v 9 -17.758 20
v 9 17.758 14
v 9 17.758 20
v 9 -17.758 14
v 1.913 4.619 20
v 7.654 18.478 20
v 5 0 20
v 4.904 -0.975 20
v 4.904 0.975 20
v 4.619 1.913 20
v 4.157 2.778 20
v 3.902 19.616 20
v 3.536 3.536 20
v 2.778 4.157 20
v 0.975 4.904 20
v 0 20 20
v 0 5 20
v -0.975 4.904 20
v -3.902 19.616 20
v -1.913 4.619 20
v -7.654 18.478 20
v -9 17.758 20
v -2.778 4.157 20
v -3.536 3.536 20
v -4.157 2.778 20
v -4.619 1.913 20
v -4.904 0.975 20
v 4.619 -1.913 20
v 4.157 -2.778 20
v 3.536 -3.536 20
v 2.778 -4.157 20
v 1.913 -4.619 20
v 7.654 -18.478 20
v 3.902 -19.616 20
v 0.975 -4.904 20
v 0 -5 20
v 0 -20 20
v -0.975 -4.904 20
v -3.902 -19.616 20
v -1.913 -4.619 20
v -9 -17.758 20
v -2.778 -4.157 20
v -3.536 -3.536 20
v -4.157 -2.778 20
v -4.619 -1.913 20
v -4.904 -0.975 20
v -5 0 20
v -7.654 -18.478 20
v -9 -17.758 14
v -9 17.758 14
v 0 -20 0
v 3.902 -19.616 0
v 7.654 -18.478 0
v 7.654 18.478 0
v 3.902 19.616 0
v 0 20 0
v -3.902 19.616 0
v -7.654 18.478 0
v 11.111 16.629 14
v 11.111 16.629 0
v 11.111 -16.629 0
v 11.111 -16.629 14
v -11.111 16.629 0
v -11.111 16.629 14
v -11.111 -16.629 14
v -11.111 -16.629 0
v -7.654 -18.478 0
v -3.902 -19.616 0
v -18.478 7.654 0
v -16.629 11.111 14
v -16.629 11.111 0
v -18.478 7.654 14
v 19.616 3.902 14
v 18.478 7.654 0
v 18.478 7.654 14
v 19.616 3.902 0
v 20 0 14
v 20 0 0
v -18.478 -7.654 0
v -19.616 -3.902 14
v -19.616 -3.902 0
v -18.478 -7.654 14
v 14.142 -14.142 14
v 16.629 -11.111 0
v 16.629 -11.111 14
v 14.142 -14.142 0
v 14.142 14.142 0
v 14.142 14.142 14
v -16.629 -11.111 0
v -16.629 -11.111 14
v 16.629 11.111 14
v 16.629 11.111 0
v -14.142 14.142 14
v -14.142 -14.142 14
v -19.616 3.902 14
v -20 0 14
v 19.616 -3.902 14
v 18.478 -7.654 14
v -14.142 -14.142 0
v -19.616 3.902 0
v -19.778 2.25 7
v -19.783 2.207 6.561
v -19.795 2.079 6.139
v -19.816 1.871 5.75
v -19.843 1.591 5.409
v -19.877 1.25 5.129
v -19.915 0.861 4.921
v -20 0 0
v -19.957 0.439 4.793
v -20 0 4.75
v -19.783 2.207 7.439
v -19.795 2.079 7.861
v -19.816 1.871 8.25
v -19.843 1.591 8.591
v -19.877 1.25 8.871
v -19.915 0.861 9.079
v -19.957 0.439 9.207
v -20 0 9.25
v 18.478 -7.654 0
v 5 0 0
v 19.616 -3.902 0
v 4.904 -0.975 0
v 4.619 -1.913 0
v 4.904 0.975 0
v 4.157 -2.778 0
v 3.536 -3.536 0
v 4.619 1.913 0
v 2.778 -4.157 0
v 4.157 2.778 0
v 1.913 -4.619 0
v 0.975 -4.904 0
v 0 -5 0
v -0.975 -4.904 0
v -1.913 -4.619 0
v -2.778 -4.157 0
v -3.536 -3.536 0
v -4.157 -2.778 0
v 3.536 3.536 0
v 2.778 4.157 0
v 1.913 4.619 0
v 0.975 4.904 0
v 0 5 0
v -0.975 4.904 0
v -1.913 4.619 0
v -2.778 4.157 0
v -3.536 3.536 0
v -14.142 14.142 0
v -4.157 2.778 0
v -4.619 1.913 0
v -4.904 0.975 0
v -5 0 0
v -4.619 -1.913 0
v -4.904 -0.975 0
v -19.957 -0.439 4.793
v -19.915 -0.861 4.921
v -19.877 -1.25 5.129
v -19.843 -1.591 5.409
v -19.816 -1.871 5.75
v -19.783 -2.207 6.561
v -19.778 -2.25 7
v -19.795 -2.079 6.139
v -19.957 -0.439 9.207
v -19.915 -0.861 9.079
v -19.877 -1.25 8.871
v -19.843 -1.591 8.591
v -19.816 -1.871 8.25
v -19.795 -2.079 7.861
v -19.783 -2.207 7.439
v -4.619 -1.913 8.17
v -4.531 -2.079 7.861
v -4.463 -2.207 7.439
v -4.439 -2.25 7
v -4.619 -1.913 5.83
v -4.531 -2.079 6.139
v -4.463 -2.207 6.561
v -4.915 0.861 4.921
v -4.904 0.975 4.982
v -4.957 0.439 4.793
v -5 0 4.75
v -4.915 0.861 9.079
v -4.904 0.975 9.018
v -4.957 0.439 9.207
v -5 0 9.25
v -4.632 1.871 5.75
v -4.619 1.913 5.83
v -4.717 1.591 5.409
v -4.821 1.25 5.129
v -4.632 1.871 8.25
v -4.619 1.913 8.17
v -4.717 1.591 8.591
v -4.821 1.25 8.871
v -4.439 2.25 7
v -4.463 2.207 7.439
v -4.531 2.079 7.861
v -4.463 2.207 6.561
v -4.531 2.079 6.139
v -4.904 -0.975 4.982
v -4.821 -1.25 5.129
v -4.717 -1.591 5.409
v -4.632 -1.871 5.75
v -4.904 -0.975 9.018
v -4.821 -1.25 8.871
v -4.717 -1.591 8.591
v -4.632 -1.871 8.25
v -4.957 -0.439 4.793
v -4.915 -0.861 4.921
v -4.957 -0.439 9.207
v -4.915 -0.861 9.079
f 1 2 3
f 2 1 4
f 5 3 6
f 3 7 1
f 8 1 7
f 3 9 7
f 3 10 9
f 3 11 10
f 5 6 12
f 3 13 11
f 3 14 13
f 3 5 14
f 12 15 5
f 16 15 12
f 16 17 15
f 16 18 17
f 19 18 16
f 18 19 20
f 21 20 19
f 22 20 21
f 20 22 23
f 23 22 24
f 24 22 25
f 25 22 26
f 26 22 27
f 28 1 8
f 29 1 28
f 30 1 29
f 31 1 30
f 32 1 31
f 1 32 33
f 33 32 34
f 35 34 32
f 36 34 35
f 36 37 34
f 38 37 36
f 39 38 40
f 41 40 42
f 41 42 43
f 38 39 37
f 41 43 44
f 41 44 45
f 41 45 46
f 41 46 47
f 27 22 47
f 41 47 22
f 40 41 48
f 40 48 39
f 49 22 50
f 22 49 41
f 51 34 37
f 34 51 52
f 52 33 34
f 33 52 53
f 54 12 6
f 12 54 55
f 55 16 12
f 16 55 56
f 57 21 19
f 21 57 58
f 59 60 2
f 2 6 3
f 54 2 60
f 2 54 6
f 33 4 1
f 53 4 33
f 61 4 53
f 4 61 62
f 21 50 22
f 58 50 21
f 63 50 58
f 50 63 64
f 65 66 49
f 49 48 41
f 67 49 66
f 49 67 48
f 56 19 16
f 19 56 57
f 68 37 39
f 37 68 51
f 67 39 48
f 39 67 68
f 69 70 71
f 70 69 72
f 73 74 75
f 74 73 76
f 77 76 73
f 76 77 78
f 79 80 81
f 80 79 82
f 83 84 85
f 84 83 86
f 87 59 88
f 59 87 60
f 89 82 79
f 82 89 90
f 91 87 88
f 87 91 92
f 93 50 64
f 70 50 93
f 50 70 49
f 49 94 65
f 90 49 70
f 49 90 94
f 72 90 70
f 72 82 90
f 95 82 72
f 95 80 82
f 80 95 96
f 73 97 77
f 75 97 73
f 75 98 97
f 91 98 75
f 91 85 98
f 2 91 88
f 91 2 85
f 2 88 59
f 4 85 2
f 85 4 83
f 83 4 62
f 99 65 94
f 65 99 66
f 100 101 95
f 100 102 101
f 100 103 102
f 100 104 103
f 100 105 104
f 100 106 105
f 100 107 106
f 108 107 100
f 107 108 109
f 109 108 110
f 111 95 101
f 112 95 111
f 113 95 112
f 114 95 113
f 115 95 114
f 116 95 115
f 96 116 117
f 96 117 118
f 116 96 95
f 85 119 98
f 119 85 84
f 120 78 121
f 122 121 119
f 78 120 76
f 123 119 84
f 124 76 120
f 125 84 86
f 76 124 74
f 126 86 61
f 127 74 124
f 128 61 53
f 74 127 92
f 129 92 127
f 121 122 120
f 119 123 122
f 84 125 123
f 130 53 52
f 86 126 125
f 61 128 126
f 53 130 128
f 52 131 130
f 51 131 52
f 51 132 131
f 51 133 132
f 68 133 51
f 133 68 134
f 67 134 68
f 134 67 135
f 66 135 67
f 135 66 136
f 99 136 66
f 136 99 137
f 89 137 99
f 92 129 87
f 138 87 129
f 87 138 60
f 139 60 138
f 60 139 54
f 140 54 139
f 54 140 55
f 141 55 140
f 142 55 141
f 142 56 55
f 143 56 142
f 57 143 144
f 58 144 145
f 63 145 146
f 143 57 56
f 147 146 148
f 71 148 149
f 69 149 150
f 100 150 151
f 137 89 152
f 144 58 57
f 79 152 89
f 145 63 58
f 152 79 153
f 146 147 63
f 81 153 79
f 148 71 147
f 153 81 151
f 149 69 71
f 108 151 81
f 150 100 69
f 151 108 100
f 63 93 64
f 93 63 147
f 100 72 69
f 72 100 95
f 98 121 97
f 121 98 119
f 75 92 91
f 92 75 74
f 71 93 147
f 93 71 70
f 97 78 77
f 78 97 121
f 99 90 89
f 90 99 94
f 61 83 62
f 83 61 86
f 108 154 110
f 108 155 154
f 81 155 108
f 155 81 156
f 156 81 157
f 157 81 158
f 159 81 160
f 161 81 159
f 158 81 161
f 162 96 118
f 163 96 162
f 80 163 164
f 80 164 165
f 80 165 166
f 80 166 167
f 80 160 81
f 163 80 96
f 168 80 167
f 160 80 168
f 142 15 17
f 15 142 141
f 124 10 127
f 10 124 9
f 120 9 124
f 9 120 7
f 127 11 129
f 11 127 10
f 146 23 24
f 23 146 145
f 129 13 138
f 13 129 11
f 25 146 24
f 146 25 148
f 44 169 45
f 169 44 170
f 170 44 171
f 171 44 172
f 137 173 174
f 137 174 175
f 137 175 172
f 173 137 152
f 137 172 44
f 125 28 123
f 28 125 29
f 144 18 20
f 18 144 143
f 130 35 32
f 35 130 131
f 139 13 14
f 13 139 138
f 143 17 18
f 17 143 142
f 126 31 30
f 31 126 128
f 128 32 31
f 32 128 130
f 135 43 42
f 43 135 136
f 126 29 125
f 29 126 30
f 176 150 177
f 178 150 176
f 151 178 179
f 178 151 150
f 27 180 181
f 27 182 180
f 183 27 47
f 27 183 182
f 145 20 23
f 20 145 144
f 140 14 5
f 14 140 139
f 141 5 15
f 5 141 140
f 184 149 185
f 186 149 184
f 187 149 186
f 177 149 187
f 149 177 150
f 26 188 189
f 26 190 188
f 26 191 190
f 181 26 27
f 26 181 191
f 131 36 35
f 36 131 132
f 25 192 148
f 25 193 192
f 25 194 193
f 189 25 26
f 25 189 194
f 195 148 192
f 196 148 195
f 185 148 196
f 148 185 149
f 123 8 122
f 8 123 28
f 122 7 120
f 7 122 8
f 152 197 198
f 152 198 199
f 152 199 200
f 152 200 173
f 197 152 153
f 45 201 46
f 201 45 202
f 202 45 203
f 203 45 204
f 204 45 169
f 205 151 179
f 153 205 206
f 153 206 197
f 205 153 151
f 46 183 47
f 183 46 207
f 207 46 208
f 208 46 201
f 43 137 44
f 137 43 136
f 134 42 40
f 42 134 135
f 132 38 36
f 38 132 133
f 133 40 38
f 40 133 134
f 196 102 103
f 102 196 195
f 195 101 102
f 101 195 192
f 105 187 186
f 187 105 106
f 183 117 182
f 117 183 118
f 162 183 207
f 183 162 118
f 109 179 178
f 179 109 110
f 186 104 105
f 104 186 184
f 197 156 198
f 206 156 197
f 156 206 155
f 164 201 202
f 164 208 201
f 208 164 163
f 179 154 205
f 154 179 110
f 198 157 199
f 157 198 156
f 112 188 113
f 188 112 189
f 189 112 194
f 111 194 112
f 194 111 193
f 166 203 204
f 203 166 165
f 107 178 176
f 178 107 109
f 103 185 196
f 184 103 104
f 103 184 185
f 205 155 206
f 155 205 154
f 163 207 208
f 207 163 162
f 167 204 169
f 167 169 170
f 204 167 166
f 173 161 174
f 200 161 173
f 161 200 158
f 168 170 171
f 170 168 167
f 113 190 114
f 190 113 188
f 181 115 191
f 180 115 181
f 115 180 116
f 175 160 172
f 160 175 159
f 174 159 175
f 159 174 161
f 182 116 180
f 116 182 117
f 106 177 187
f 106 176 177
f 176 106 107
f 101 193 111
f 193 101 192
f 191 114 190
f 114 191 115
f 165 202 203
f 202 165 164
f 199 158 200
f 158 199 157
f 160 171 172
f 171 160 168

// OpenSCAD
$fn = 32;

// ----------------------------------------------------------------------
// Oldham coupling hub: 40 x 20 mm
// ----------------------------------------------------------------------

// --- parameters (mm) ---
body_d = 40;              // hub diameter
body_l = 14;              // hub length
shaft_d = 10;             // shaft bore
cam_w = 18;               // drive tongue width
tongue_h = 6;             // drive tongue height
set_d = 4.5;              // set screw tap hole

module hub() {
  cylinder(h = body_l, d = body_d);
  /* tongue, clipped to the hub disc and sunk 1 mm into the face */
  intersection() {
    translate([-cam_w / 2, -body_d / 2, body_l - 1])
      cube([cam_w, body_d, tongue_h + 1]);
    translate([0, 0, body_l - 1]) cylinder(h = tongue_h + 1, d = body_d);
  }
}

difference() {
  hub();
  translate([0, 0, -1]) cylinder(h = body_l + tongue_h + 2, d = shaft_d);
  translate([-body_d / 2 - 1, 0, body_l * 0.5])
    rotate([0, 90, 0]) cylinder(h = body_d / 2 + 2, d = set_d);
}
